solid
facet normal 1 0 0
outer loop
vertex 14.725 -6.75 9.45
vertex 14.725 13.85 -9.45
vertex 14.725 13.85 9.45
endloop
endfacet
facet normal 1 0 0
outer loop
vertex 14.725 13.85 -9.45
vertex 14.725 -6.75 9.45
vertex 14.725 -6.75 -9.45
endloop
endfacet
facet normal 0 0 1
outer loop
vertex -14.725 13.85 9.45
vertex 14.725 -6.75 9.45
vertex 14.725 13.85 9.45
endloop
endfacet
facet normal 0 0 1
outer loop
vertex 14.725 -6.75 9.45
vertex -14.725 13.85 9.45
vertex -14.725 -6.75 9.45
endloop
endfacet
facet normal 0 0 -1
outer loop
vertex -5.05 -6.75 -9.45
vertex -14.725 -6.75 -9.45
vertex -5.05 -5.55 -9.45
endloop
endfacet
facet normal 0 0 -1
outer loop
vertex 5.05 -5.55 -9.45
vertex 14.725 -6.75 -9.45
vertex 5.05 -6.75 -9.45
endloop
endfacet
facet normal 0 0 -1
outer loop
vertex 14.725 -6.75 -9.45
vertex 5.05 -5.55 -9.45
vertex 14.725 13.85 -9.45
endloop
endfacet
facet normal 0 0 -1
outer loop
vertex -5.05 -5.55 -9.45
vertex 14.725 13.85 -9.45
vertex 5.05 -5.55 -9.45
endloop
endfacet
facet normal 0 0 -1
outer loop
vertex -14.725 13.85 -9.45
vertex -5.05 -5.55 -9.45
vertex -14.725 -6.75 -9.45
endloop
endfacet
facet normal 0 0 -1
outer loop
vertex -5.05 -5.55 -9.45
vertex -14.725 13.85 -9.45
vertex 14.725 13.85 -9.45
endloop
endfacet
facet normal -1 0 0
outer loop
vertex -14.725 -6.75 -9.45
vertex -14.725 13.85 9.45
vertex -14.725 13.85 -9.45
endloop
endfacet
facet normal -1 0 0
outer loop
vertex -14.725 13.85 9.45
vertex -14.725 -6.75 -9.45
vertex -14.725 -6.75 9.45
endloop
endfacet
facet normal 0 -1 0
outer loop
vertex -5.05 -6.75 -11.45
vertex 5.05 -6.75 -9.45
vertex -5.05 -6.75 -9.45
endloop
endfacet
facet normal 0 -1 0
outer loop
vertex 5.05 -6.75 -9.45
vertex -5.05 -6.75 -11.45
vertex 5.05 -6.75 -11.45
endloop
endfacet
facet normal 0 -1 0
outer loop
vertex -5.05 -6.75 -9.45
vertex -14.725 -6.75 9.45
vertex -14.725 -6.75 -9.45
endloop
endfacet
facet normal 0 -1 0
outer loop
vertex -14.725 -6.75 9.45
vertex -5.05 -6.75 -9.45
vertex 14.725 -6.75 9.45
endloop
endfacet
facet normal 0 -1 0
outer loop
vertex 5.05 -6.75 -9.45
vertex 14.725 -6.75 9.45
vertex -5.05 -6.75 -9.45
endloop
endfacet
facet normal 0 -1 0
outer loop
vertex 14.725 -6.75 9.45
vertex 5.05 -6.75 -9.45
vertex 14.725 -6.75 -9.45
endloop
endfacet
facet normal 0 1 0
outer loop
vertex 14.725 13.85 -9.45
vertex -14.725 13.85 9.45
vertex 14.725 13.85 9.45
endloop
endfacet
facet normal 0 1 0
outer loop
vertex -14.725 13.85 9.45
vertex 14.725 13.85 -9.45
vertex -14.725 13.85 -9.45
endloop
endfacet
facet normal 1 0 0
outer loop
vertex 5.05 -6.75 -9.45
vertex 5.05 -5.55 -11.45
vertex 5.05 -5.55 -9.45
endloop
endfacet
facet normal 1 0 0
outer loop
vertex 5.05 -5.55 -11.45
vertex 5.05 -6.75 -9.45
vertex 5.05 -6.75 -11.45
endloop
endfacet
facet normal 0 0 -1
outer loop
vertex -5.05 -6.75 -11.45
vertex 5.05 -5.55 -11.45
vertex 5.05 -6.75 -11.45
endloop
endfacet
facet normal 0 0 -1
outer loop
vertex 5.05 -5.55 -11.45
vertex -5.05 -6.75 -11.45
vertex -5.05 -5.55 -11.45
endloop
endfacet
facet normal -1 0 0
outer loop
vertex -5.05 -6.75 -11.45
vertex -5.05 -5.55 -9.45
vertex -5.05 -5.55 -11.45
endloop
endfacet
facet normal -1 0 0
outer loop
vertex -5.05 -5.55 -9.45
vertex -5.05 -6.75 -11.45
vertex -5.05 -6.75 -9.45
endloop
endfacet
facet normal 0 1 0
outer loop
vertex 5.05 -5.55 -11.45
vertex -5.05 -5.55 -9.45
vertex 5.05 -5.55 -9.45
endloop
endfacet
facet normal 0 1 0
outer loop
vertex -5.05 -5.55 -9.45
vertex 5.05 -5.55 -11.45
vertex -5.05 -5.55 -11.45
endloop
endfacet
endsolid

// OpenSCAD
// Sharp GP2Y0D413K0F Distance Sensor Model
// Units: mm

/* [Dimensions] */
body_width = 29.45;
body_depth = 13.5;
body_height = 18.9;

lens_protrusion = 7.1;
lens_case_width = 29.45;
lens_case_height = 18.9;

// Lens center positions (marked with * in datasheet)
// Emitter center: 4.5mm from left edge
// Distance between centers: 19.7mm
emitter_x = -body_width/2 + 4.5;
detector_x = emitter_x + 19.7;
lens_z = 5.0; // Estimated center height from origin
lens_y = body_depth/2 + lens_protrusion/2;
lens_radius = 2.5; // Approximate radius for visualization

// Connector dimensions
conn_width = 10.1;
conn_depth = 1.2;
conn_height = 2.0;

/* [Rendering] */
$fn = 32;

union() {
    // Main Case Body
    color("LightGray")
    cube([body_width, body_depth, body_height], center=true);

    // Lens Case (Protrusion)
    color("DimGray")
    translate([0, body_depth/2 + lens_protrusion/2, 0])
    cube([lens_case_width, lens_protrusion, lens_case_height], center=true);

    // Lenses (Emitter and Detector)
    color("Black") {
        // Emitter
        translate([emitter_x, lens_y, lens_z])
        rotate([0, 90, 0])
        cylinder(h = lens_protrusion + 1, r = lens_radius, center=true);

        // Detector
        translate([detector_x, lens_y, lens_z])
        rotate([0, 90, 0])
        cylinder(h = lens_protrusion + 1, r = lens_radius, center=true);
    }

    // Connector / PWB Area
    // Positioned at the bottom (-Z)
    color("Green")
    translate([0, -body_depth/2 + conn_depth/2, -body_height/2 - conn_height/2])
    cube([conn_width, conn_depth, conn_height], center=true);
}

// Guide lines for origin and PWB plane (Optional, can be commented out)
%translate([-body_width/2, 0, -body_height/2]) cube([body_width, body_depth, 0.1]);
